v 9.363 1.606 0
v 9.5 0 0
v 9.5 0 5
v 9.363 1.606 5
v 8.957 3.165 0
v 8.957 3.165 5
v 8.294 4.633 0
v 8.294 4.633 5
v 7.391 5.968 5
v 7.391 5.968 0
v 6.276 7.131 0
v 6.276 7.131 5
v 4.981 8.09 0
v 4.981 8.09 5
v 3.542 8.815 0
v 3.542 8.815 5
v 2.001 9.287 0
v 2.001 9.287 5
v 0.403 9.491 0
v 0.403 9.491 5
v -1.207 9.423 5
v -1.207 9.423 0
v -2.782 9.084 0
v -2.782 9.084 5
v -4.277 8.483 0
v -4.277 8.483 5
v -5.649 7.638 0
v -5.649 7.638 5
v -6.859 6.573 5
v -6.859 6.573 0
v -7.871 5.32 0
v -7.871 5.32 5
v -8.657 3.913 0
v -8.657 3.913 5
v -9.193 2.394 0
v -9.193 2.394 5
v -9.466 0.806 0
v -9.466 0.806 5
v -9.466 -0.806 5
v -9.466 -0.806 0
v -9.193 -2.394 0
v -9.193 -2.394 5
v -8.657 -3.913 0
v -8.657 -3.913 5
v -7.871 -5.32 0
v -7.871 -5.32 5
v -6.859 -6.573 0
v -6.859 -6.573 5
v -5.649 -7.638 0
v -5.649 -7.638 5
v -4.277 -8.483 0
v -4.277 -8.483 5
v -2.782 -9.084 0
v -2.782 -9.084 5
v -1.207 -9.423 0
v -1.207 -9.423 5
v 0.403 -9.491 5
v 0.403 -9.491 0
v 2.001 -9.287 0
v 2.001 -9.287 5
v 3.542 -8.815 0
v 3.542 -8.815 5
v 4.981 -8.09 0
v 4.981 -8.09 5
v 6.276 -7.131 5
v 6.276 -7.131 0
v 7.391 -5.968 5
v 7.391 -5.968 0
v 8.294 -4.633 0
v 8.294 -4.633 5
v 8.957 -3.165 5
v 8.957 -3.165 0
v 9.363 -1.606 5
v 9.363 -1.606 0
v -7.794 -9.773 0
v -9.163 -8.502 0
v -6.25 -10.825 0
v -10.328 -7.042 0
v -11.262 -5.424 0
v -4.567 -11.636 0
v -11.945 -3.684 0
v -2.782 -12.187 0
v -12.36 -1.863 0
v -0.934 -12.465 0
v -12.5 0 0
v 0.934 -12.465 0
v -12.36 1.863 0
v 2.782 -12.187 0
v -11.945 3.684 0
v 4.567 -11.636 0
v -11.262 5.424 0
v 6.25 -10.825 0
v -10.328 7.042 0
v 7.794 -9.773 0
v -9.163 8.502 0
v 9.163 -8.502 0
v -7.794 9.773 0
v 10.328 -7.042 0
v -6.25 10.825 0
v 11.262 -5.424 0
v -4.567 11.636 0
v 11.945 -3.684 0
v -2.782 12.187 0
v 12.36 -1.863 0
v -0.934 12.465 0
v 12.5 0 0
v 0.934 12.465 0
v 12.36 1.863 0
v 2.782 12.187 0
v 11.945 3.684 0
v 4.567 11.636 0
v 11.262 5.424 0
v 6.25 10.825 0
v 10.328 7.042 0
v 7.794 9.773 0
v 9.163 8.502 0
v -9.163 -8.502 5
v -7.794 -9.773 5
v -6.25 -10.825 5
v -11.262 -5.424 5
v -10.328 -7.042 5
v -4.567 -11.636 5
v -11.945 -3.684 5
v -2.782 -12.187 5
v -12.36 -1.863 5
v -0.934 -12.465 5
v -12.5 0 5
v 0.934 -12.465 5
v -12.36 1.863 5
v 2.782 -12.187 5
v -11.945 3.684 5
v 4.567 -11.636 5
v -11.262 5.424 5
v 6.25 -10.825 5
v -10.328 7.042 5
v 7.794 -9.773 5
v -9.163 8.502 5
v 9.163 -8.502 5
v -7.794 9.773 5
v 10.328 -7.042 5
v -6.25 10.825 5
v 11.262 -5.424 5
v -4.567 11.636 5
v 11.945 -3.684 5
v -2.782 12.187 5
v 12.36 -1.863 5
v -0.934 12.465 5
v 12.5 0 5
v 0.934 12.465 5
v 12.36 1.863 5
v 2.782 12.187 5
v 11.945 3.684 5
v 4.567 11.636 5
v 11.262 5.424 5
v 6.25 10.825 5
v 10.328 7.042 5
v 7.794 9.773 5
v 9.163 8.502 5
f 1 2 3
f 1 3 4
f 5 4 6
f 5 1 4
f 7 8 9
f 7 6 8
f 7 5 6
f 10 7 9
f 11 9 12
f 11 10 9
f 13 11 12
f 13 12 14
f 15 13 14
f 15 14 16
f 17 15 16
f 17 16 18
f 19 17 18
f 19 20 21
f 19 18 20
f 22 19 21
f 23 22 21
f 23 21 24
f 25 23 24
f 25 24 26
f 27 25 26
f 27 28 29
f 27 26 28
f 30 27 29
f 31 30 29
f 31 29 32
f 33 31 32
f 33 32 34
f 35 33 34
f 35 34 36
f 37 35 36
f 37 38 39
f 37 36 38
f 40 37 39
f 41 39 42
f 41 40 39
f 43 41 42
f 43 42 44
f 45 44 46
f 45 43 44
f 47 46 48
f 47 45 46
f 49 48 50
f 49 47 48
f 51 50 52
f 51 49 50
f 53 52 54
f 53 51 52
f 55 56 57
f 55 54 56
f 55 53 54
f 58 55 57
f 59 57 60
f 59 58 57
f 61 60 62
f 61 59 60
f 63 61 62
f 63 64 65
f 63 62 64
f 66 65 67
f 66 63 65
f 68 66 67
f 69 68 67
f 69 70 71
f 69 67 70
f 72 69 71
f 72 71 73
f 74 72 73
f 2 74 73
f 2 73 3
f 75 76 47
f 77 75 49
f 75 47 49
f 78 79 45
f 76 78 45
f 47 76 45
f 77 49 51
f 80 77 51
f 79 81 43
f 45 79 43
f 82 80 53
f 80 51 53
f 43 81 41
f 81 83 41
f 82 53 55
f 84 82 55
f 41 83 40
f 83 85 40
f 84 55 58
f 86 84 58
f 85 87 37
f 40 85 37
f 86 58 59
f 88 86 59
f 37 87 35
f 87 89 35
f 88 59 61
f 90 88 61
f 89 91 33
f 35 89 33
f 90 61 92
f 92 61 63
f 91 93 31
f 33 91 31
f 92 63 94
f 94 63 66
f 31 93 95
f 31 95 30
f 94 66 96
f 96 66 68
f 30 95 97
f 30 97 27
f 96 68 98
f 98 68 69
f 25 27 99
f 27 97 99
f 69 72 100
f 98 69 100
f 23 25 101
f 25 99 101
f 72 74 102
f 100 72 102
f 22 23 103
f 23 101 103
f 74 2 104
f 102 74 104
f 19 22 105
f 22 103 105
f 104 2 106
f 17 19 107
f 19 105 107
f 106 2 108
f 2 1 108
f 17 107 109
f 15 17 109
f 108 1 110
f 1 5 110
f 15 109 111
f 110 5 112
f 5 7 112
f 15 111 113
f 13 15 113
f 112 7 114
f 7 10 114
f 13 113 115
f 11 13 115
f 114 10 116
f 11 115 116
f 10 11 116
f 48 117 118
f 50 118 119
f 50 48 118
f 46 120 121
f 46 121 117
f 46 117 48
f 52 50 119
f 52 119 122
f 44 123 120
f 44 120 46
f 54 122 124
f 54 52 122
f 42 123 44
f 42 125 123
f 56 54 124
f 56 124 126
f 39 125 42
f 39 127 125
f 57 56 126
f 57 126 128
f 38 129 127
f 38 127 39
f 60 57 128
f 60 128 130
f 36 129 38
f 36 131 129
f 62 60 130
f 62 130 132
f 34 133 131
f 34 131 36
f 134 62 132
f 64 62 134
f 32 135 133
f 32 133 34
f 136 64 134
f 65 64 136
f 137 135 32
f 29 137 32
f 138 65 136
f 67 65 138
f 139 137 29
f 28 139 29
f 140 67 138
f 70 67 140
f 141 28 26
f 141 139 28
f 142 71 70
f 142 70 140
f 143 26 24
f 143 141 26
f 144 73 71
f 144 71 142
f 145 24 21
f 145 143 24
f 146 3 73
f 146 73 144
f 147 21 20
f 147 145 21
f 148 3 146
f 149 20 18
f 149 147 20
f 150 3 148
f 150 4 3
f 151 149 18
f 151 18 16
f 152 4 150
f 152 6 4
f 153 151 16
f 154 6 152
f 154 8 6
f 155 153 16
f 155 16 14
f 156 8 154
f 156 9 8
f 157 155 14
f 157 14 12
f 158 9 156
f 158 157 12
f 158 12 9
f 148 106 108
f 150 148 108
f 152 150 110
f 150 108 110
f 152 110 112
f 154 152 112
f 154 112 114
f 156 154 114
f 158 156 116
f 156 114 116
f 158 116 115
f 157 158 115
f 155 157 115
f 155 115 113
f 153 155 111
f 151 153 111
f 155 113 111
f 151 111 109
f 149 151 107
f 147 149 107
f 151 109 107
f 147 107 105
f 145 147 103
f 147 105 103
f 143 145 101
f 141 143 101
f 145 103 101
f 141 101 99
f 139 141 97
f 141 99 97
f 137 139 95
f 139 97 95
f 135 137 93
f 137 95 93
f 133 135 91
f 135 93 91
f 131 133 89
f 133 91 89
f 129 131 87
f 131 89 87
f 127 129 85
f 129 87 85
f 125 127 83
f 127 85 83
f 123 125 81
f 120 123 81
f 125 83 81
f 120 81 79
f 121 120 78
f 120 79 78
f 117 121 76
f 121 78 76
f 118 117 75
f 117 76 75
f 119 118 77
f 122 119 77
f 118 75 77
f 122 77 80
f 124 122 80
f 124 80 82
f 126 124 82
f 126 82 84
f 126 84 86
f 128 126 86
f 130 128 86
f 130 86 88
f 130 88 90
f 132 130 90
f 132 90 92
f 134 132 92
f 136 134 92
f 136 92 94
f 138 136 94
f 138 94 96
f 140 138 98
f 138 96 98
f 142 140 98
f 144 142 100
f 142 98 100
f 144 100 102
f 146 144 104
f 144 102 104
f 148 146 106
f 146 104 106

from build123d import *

# Parameters (mm, degrees)
CYLINDER001_R     = 9.5
CYLINDER001_DEPTH = 15
CYLINDER_R        = 12.5
CYLINDER_DEPTH    = 5


with BuildPart() as cilindro_interior:
    # Cylinder001 → Cylinder001 (new body)
    with BuildSketch(Plane.XY.offset(-4)):
        Circle(CYLINDER001_R)
    extrude(amount=CYLINDER001_DEPTH)


with BuildPart() as cuerpo_anillo:
    # Cylinder → Cylinder (new body)
    with BuildSketch(Plane.XY):
        Circle(CYLINDER_R)
    extrude(amount=CYLINDER_DEPTH)

    # Cut: cut Cilindro-interior
    add(cilindro_interior.part, mode=Mode.SUBTRACT)


solid = cuerpo_anillo.part
